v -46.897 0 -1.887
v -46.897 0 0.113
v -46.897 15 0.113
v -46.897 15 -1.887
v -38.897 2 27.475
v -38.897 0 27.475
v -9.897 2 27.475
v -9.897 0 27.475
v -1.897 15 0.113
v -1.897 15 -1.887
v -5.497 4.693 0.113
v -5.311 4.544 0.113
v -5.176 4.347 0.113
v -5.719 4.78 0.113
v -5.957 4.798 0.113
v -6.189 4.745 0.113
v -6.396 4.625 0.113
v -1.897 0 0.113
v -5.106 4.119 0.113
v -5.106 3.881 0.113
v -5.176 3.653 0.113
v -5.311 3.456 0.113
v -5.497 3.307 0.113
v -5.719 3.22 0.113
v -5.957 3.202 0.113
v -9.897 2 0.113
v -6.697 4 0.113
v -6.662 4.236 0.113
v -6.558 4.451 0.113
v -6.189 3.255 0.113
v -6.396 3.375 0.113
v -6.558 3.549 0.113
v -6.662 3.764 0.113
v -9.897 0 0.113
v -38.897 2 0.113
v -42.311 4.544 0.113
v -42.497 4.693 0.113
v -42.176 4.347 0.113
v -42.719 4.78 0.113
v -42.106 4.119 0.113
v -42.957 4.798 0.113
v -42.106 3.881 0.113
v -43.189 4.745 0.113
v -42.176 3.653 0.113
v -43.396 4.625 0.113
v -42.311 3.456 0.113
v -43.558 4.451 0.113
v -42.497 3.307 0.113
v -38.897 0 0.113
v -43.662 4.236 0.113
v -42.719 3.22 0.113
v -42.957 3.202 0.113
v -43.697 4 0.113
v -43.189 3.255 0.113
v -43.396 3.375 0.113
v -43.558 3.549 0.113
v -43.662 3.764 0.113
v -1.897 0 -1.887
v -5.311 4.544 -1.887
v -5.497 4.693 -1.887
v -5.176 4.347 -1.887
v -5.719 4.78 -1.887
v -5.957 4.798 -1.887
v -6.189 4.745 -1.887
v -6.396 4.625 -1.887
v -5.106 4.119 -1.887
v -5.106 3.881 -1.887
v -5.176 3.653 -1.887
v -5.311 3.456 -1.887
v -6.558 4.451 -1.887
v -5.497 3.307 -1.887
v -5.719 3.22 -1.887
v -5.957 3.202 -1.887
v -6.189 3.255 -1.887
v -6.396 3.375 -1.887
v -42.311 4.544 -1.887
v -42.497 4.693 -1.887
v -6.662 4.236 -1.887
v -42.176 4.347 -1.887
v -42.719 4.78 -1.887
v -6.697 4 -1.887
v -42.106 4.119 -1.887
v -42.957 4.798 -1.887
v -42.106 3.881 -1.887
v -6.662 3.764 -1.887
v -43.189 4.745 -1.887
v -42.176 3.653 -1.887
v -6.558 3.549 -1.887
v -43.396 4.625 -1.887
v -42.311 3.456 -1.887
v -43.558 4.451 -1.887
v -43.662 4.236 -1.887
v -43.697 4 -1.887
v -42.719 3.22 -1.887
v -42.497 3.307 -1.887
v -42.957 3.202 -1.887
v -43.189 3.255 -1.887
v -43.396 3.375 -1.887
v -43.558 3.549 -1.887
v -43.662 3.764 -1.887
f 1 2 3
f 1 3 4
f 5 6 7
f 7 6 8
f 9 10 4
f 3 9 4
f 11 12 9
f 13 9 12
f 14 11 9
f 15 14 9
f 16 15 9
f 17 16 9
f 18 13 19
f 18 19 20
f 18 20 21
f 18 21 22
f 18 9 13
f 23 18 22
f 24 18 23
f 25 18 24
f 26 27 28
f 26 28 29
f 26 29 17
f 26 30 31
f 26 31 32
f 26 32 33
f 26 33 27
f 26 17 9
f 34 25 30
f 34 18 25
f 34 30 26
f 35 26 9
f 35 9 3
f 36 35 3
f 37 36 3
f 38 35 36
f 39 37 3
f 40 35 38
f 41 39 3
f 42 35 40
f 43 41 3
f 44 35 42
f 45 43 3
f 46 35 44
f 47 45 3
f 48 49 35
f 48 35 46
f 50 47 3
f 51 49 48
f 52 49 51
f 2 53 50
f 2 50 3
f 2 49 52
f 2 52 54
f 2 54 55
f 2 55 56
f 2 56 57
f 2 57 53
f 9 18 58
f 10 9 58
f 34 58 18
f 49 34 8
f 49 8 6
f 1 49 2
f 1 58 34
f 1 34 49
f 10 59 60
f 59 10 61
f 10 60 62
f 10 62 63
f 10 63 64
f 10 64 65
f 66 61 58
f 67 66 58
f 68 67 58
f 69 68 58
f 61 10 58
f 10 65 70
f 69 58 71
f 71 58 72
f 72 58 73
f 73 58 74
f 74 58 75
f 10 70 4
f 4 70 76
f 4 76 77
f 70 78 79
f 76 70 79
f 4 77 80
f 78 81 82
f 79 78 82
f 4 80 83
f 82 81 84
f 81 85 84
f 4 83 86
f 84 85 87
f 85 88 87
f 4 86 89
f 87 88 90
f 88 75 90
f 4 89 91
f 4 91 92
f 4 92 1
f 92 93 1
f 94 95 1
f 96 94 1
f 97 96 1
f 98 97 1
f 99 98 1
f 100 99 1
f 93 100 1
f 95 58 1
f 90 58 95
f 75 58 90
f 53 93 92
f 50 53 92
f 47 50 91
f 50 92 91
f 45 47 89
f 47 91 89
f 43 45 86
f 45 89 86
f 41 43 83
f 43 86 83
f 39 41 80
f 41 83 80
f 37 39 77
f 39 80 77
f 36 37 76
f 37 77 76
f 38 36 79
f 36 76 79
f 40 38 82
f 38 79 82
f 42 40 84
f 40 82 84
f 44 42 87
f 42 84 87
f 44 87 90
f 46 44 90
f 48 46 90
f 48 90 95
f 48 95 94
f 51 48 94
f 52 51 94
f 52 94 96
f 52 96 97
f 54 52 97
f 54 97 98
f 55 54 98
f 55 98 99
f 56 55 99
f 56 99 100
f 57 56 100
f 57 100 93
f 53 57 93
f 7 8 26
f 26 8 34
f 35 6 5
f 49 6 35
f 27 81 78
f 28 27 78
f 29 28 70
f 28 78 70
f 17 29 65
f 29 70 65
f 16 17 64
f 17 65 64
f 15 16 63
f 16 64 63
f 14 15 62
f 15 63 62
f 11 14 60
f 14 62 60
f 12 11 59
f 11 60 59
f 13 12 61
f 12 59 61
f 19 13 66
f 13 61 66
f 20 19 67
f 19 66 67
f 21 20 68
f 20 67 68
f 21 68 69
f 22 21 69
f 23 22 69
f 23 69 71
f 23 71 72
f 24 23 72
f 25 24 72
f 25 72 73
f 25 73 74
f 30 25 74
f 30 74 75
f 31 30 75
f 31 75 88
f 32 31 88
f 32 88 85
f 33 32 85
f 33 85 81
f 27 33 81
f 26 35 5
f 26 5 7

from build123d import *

# Parameters (mm, degrees)
SKETCH2_W                   = 29
SKETCH2_H                   = 27.475014389
BOSS_EXTRUDE1_DEPTH         = 2
SKETCH7_W                   = 45
SKETCH7_H                   = 2
BOSS_EXTRUDE2_DEPTH         = 15
TAP_DRILL_FOR_M2X0_4_TAP1_D = 1.6
TAP_DRILL_FOR_M2X0_4_TAP2_D = 1.6


with BuildPart() as part:
    # Sketch2 → Boss-Extrude1 (new body)
    with BuildSketch(Plane(origin=(0, 0, 0), x_dir=(1, 0, 0), z_dir=(0, 1, 0))):
        with Locations((-24.397211382, -13.737507195)):
            Rectangle(SKETCH2_W, SKETCH2_H)
    extrude(amount=BOSS_EXTRUDE1_DEPTH)

    # Sketch7 → Boss-Extrude2 (add)
    with BuildSketch(Plane(origin=(0, 0, 0), x_dir=(-1, 0, 0), z_dir=(0, -1, 0))):
        with Locations((24.397211382, 0.886680676)):
            Rectangle(SKETCH7_W, SKETCH7_H)
    extrude(amount=-BOSS_EXTRUDE2_DEPTH)

    # Tap Drill for M2x0.4 Tap1 (through all)
    with Locations(Plane.XY.offset(0.113319324)):
        with Locations((-42.897211382, 4)):
            Hole(TAP_DRILL_FOR_M2X0_4_TAP1_D / 2)

    # Tap Drill for M2x0.4 Tap2 (through all)
    with Locations(Plane.XY.offset(0.113319324)):
        with Locations((-5.897211382, 4)):
            Hole(TAP_DRILL_FOR_M2X0_4_TAP2_D / 2)


solid = part.part
